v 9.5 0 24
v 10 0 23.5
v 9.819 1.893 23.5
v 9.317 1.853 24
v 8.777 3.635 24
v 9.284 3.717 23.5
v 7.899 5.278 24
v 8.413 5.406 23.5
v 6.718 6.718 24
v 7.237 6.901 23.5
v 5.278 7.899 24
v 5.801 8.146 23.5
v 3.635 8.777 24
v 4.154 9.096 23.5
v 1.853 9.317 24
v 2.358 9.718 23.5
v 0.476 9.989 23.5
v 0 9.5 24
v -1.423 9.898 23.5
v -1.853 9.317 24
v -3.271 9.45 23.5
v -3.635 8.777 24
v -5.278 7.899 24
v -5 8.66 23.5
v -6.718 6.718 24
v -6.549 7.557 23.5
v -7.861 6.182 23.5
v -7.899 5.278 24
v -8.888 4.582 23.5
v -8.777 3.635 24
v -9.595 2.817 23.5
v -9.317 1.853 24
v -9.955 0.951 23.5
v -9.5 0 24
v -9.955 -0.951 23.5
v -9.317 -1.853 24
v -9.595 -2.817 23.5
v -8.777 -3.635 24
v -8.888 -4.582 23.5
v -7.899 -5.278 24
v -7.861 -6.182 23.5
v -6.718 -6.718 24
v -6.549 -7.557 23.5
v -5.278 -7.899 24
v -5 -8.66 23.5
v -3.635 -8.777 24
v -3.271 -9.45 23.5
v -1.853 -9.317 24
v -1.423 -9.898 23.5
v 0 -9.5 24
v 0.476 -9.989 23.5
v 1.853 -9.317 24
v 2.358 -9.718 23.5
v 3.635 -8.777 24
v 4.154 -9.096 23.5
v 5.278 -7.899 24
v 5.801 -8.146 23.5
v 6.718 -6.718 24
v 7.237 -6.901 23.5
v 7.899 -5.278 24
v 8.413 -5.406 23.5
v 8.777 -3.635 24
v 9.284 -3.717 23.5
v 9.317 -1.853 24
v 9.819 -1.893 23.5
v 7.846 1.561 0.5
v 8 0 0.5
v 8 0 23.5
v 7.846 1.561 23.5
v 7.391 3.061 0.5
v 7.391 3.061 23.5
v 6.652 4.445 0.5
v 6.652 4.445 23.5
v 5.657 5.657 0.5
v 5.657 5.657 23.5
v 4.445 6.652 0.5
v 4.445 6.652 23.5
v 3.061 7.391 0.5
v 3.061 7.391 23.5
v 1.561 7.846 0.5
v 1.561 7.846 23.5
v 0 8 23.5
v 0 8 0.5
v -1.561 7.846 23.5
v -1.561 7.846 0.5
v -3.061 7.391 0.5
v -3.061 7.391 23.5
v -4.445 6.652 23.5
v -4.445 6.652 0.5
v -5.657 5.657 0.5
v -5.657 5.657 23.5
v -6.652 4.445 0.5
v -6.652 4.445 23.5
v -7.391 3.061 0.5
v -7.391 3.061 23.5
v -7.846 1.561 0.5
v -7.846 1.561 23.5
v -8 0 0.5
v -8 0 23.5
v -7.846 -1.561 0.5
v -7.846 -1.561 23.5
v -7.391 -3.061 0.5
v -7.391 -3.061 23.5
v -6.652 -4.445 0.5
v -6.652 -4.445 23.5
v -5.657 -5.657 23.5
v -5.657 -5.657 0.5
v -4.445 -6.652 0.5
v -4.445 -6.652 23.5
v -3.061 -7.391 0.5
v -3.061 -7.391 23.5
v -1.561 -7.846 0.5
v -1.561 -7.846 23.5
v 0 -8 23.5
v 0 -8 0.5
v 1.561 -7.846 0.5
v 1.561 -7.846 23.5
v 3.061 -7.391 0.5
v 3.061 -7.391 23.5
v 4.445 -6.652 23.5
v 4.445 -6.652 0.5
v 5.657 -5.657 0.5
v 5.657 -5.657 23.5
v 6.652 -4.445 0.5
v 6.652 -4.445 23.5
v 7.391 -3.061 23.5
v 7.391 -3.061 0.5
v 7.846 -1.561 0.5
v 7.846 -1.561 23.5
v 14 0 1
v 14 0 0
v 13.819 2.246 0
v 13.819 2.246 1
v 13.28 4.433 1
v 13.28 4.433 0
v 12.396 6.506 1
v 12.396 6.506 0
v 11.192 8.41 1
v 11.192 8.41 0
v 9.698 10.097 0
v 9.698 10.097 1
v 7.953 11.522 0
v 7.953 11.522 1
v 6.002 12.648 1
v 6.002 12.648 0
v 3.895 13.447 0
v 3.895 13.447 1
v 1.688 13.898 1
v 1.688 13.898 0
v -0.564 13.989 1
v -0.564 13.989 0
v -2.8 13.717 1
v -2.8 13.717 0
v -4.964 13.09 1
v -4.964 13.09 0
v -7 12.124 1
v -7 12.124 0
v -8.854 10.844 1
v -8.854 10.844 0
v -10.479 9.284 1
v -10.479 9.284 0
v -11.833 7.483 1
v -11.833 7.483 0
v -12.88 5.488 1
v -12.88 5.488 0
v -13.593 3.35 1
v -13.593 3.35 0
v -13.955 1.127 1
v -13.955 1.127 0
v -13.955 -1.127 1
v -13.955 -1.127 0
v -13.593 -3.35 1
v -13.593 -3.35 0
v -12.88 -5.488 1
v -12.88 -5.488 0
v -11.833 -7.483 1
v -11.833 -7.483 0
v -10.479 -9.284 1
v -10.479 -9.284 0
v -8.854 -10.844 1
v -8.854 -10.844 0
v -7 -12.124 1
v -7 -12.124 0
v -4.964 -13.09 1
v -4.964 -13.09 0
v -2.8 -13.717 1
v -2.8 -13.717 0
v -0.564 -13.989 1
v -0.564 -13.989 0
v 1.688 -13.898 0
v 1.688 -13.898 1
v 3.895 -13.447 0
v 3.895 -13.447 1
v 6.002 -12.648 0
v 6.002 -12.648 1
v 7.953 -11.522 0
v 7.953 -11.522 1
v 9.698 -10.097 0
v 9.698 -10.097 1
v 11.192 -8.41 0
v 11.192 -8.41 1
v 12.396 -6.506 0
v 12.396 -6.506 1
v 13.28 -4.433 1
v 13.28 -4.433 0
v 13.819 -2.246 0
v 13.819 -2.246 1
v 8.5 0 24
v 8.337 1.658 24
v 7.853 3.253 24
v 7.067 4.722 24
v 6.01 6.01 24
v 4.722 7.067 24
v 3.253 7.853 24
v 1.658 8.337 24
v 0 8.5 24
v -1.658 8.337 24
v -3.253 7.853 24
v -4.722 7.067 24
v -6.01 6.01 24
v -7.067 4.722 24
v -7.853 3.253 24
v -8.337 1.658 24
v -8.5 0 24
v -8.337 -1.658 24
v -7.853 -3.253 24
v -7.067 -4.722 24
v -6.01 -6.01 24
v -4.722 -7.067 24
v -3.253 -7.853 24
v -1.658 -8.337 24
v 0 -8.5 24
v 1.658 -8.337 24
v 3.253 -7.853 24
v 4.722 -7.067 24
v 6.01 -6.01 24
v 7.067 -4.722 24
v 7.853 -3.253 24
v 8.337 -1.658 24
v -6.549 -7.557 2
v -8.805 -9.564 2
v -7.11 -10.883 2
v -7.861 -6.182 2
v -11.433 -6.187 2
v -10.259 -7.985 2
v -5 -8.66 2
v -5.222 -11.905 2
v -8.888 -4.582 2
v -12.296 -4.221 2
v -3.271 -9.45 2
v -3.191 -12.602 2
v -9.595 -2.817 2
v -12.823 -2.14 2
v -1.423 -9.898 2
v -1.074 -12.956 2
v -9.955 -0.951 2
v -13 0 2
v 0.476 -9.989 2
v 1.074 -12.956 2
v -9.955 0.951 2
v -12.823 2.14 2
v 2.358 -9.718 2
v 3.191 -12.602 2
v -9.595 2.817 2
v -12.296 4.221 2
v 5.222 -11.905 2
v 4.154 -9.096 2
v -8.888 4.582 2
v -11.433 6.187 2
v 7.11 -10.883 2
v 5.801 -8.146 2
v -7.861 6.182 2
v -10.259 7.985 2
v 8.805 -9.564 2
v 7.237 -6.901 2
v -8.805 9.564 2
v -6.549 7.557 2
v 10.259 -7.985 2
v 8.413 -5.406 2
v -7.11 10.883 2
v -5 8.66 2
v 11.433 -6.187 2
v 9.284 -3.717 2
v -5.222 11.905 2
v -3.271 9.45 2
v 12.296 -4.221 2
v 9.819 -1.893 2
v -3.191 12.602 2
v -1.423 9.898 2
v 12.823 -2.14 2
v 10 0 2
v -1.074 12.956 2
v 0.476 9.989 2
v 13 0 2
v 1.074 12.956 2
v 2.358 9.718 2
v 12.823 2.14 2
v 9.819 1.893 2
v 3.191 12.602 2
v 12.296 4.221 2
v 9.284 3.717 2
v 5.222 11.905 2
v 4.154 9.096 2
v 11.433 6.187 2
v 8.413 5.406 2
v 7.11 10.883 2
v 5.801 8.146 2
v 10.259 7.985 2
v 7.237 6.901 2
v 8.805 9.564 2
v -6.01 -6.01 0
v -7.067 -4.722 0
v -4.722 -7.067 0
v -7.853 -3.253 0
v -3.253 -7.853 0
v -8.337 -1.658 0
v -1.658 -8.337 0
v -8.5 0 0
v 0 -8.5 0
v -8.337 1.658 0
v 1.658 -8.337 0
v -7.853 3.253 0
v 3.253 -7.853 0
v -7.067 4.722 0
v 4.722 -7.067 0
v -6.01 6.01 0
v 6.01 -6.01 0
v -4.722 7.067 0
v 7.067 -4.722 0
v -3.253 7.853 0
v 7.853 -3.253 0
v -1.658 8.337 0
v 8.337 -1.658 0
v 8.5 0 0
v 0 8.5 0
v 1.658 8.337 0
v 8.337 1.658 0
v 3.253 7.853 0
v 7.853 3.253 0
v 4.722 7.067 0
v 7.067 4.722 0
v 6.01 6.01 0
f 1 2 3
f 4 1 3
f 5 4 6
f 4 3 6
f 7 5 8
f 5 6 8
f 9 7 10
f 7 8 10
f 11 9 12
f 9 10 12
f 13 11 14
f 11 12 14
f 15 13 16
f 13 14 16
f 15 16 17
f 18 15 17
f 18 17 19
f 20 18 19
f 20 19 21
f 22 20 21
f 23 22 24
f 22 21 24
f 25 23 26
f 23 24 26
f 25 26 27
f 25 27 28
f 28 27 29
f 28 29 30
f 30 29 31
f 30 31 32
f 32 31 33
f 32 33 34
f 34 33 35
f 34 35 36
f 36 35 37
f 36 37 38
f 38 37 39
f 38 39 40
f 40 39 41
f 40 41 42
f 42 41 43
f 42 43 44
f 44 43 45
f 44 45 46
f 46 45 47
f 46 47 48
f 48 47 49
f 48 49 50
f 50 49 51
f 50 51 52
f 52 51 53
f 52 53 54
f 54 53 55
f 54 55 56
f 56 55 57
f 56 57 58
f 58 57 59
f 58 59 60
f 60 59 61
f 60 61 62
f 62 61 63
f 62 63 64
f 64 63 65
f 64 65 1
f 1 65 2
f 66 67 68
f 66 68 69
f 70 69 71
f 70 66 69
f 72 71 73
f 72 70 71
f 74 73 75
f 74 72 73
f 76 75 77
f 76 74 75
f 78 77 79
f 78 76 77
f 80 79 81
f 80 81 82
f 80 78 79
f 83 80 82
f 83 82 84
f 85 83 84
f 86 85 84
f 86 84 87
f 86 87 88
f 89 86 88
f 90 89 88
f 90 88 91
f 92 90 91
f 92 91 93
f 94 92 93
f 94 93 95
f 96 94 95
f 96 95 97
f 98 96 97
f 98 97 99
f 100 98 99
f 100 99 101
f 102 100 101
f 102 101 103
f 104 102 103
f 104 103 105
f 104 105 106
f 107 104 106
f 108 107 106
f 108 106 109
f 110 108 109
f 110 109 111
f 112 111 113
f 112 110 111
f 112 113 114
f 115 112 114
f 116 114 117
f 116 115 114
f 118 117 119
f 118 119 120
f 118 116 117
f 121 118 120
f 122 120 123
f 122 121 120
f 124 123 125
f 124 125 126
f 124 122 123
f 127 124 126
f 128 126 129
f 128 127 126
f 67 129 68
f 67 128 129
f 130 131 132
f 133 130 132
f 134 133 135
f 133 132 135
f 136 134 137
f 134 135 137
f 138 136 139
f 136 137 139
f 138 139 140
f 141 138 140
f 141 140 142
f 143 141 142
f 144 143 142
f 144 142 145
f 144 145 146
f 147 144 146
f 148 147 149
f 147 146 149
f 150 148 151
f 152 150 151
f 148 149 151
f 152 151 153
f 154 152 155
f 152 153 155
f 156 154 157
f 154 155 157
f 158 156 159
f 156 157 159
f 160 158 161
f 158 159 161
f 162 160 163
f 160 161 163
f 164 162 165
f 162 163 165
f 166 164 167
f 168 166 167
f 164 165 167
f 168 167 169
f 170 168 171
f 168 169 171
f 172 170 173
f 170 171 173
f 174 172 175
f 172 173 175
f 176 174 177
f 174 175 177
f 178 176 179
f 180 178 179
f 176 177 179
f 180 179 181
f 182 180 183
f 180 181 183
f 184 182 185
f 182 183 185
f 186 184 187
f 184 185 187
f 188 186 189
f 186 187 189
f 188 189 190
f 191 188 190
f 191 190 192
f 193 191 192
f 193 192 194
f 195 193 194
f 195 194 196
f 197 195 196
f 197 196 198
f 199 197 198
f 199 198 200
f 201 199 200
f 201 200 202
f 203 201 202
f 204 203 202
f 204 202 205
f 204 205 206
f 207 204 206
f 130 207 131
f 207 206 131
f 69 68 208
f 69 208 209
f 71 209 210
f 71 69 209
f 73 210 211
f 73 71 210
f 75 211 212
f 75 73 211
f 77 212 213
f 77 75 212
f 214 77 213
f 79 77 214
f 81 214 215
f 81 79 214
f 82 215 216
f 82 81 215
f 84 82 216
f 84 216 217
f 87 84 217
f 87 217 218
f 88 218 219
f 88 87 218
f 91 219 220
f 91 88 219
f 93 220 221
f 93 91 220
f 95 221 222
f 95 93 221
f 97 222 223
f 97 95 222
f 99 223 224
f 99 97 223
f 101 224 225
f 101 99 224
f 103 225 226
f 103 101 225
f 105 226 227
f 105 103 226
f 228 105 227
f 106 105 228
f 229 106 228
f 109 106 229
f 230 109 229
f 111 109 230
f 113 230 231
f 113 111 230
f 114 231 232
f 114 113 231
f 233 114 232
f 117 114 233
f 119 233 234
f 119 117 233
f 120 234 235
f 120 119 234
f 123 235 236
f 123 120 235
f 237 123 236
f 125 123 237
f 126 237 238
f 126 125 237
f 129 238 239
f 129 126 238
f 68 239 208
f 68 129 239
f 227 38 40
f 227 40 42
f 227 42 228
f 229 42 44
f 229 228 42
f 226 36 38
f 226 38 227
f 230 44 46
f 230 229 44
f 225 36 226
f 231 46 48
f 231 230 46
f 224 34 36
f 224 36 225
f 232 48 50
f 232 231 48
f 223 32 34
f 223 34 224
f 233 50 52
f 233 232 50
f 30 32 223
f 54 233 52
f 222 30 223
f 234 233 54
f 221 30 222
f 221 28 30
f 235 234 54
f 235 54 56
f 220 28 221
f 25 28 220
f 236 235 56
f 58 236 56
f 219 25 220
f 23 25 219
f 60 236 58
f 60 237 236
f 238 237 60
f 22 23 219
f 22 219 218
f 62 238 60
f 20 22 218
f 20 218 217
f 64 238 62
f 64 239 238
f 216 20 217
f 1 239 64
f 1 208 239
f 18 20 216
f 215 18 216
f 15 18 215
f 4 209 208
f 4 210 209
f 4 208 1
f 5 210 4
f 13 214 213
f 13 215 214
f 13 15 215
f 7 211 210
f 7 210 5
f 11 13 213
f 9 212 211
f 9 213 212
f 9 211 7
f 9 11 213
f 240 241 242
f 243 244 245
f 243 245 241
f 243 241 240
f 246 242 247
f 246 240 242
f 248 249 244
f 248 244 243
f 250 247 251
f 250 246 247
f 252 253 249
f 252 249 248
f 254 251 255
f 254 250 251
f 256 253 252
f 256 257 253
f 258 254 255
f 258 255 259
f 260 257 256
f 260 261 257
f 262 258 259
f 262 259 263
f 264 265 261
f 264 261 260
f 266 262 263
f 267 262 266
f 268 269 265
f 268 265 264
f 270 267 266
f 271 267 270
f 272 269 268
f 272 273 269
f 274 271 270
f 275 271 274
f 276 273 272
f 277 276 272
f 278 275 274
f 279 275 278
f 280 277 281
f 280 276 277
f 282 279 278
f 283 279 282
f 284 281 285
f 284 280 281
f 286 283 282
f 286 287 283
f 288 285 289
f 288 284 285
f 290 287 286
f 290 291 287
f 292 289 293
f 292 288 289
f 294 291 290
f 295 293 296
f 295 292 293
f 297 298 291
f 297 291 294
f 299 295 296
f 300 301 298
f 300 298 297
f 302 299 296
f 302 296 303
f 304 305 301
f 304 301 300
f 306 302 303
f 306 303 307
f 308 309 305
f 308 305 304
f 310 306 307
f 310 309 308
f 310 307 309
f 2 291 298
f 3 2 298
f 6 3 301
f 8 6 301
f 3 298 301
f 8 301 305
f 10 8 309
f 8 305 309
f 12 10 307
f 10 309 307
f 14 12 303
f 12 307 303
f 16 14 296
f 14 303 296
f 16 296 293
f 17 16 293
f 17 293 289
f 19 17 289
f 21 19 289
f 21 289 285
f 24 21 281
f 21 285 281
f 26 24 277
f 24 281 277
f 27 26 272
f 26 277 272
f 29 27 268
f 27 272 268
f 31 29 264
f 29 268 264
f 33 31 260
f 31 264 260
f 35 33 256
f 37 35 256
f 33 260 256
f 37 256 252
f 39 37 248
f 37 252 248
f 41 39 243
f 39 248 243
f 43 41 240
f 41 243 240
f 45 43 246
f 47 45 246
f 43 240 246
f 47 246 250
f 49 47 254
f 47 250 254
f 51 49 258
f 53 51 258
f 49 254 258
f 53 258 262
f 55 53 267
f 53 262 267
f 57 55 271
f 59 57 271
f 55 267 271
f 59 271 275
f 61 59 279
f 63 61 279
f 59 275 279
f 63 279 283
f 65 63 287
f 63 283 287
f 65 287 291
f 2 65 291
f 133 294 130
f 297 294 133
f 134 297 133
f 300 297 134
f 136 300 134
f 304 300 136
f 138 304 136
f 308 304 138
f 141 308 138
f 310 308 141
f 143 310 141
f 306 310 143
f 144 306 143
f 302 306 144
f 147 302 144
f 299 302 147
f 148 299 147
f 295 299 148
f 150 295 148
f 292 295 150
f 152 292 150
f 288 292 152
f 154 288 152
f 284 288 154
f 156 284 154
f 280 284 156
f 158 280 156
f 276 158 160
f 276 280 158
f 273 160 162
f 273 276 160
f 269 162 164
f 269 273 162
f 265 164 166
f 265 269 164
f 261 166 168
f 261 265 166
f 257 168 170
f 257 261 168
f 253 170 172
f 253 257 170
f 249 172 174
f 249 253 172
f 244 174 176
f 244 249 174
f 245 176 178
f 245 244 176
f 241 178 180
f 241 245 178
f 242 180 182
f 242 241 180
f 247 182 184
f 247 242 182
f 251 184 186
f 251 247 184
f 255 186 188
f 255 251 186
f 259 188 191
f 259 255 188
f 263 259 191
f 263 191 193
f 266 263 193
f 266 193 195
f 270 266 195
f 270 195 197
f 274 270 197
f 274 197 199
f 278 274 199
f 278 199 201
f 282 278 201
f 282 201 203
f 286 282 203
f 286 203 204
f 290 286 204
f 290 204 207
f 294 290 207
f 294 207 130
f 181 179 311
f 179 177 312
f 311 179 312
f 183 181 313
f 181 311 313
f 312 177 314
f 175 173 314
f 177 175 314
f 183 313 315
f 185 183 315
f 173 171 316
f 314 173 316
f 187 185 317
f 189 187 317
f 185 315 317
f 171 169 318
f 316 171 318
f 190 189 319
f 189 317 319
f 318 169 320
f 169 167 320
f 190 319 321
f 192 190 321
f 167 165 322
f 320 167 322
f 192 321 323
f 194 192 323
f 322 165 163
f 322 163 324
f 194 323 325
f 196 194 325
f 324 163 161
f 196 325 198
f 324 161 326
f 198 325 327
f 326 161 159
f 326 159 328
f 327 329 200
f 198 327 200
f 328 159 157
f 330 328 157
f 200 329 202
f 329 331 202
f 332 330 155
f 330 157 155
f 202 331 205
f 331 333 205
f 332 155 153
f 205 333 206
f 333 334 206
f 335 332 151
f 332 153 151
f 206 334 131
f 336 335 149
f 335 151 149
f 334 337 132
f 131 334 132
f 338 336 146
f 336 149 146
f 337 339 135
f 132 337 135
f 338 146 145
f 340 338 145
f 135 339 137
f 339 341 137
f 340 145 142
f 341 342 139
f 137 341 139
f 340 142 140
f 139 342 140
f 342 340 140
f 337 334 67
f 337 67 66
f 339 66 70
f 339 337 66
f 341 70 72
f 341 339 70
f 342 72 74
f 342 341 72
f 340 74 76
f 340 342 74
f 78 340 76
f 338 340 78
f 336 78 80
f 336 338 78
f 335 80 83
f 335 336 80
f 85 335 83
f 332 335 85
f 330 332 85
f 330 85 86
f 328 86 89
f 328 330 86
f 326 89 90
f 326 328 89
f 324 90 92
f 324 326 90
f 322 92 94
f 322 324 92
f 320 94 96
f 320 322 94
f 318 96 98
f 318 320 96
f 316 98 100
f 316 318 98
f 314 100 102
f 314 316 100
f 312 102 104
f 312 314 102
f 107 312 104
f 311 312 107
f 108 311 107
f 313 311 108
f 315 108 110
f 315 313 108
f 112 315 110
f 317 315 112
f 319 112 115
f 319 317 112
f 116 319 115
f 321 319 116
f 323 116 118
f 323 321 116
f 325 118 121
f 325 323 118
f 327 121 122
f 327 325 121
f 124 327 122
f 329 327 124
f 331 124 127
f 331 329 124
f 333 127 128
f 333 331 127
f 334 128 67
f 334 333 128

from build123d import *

# Parameters (mm, degrees)
SKETCH_R        = 14
SKETCH_R_2      = 8
PAD_DEPTH       = 2
SKETCH001_R     = 10
SKETCH001_R_2   = 8
PAD001_DEPTH    = 22
CHAMFER_SIZE    = 0.5
CHAMFER001_SIZE = 0.5
CHAMFER002_SIZE = 0.5
CHAMFER003_SIZE = 1


with BuildPart() as part:
    # Sketch → Pad (new body)
    with BuildSketch(Plane.XY):
        Circle(SKETCH_R)
        Circle(SKETCH_R_2, mode=Mode.SUBTRACT)
    extrude(amount=PAD_DEPTH)

    # Sketch001 (on Face4 of Pad) → Pad001 (join)
    with BuildSketch(Plane.XY.offset(2)):
        Circle(SKETCH001_R)
        Circle(SKETCH001_R_2, mode=Mode.SUBTRACT)
    extrude(amount=PAD001_DEPTH)

    # Chamfer
    chamfer_edges = [part.edges().sort_by_distance(p)[0] for p in [
        (-8, 0, 24),
    ]]
    chamfer(chamfer_edges, length=CHAMFER_SIZE)

    # Chamfer001
    chamfer001_edges = [part.edges().sort_by_distance(p)[0] for p in [
        (-10, 0, 24),
    ]]
    chamfer(chamfer001_edges, length=CHAMFER001_SIZE)

    # Chamfer002
    chamfer002_edges = [part.edges().sort_by_distance(p)[0] for p in [
        (-8, 0, 0),
    ]]
    chamfer(chamfer002_edges, length=CHAMFER002_SIZE)

    # Chamfer003
    chamfer003_edges = [part.edges().sort_by_distance(p)[0] for p in [
        (-14, 0, 2),
    ]]
    chamfer(chamfer003_edges, length=CHAMFER003_SIZE)


solid = part.part
